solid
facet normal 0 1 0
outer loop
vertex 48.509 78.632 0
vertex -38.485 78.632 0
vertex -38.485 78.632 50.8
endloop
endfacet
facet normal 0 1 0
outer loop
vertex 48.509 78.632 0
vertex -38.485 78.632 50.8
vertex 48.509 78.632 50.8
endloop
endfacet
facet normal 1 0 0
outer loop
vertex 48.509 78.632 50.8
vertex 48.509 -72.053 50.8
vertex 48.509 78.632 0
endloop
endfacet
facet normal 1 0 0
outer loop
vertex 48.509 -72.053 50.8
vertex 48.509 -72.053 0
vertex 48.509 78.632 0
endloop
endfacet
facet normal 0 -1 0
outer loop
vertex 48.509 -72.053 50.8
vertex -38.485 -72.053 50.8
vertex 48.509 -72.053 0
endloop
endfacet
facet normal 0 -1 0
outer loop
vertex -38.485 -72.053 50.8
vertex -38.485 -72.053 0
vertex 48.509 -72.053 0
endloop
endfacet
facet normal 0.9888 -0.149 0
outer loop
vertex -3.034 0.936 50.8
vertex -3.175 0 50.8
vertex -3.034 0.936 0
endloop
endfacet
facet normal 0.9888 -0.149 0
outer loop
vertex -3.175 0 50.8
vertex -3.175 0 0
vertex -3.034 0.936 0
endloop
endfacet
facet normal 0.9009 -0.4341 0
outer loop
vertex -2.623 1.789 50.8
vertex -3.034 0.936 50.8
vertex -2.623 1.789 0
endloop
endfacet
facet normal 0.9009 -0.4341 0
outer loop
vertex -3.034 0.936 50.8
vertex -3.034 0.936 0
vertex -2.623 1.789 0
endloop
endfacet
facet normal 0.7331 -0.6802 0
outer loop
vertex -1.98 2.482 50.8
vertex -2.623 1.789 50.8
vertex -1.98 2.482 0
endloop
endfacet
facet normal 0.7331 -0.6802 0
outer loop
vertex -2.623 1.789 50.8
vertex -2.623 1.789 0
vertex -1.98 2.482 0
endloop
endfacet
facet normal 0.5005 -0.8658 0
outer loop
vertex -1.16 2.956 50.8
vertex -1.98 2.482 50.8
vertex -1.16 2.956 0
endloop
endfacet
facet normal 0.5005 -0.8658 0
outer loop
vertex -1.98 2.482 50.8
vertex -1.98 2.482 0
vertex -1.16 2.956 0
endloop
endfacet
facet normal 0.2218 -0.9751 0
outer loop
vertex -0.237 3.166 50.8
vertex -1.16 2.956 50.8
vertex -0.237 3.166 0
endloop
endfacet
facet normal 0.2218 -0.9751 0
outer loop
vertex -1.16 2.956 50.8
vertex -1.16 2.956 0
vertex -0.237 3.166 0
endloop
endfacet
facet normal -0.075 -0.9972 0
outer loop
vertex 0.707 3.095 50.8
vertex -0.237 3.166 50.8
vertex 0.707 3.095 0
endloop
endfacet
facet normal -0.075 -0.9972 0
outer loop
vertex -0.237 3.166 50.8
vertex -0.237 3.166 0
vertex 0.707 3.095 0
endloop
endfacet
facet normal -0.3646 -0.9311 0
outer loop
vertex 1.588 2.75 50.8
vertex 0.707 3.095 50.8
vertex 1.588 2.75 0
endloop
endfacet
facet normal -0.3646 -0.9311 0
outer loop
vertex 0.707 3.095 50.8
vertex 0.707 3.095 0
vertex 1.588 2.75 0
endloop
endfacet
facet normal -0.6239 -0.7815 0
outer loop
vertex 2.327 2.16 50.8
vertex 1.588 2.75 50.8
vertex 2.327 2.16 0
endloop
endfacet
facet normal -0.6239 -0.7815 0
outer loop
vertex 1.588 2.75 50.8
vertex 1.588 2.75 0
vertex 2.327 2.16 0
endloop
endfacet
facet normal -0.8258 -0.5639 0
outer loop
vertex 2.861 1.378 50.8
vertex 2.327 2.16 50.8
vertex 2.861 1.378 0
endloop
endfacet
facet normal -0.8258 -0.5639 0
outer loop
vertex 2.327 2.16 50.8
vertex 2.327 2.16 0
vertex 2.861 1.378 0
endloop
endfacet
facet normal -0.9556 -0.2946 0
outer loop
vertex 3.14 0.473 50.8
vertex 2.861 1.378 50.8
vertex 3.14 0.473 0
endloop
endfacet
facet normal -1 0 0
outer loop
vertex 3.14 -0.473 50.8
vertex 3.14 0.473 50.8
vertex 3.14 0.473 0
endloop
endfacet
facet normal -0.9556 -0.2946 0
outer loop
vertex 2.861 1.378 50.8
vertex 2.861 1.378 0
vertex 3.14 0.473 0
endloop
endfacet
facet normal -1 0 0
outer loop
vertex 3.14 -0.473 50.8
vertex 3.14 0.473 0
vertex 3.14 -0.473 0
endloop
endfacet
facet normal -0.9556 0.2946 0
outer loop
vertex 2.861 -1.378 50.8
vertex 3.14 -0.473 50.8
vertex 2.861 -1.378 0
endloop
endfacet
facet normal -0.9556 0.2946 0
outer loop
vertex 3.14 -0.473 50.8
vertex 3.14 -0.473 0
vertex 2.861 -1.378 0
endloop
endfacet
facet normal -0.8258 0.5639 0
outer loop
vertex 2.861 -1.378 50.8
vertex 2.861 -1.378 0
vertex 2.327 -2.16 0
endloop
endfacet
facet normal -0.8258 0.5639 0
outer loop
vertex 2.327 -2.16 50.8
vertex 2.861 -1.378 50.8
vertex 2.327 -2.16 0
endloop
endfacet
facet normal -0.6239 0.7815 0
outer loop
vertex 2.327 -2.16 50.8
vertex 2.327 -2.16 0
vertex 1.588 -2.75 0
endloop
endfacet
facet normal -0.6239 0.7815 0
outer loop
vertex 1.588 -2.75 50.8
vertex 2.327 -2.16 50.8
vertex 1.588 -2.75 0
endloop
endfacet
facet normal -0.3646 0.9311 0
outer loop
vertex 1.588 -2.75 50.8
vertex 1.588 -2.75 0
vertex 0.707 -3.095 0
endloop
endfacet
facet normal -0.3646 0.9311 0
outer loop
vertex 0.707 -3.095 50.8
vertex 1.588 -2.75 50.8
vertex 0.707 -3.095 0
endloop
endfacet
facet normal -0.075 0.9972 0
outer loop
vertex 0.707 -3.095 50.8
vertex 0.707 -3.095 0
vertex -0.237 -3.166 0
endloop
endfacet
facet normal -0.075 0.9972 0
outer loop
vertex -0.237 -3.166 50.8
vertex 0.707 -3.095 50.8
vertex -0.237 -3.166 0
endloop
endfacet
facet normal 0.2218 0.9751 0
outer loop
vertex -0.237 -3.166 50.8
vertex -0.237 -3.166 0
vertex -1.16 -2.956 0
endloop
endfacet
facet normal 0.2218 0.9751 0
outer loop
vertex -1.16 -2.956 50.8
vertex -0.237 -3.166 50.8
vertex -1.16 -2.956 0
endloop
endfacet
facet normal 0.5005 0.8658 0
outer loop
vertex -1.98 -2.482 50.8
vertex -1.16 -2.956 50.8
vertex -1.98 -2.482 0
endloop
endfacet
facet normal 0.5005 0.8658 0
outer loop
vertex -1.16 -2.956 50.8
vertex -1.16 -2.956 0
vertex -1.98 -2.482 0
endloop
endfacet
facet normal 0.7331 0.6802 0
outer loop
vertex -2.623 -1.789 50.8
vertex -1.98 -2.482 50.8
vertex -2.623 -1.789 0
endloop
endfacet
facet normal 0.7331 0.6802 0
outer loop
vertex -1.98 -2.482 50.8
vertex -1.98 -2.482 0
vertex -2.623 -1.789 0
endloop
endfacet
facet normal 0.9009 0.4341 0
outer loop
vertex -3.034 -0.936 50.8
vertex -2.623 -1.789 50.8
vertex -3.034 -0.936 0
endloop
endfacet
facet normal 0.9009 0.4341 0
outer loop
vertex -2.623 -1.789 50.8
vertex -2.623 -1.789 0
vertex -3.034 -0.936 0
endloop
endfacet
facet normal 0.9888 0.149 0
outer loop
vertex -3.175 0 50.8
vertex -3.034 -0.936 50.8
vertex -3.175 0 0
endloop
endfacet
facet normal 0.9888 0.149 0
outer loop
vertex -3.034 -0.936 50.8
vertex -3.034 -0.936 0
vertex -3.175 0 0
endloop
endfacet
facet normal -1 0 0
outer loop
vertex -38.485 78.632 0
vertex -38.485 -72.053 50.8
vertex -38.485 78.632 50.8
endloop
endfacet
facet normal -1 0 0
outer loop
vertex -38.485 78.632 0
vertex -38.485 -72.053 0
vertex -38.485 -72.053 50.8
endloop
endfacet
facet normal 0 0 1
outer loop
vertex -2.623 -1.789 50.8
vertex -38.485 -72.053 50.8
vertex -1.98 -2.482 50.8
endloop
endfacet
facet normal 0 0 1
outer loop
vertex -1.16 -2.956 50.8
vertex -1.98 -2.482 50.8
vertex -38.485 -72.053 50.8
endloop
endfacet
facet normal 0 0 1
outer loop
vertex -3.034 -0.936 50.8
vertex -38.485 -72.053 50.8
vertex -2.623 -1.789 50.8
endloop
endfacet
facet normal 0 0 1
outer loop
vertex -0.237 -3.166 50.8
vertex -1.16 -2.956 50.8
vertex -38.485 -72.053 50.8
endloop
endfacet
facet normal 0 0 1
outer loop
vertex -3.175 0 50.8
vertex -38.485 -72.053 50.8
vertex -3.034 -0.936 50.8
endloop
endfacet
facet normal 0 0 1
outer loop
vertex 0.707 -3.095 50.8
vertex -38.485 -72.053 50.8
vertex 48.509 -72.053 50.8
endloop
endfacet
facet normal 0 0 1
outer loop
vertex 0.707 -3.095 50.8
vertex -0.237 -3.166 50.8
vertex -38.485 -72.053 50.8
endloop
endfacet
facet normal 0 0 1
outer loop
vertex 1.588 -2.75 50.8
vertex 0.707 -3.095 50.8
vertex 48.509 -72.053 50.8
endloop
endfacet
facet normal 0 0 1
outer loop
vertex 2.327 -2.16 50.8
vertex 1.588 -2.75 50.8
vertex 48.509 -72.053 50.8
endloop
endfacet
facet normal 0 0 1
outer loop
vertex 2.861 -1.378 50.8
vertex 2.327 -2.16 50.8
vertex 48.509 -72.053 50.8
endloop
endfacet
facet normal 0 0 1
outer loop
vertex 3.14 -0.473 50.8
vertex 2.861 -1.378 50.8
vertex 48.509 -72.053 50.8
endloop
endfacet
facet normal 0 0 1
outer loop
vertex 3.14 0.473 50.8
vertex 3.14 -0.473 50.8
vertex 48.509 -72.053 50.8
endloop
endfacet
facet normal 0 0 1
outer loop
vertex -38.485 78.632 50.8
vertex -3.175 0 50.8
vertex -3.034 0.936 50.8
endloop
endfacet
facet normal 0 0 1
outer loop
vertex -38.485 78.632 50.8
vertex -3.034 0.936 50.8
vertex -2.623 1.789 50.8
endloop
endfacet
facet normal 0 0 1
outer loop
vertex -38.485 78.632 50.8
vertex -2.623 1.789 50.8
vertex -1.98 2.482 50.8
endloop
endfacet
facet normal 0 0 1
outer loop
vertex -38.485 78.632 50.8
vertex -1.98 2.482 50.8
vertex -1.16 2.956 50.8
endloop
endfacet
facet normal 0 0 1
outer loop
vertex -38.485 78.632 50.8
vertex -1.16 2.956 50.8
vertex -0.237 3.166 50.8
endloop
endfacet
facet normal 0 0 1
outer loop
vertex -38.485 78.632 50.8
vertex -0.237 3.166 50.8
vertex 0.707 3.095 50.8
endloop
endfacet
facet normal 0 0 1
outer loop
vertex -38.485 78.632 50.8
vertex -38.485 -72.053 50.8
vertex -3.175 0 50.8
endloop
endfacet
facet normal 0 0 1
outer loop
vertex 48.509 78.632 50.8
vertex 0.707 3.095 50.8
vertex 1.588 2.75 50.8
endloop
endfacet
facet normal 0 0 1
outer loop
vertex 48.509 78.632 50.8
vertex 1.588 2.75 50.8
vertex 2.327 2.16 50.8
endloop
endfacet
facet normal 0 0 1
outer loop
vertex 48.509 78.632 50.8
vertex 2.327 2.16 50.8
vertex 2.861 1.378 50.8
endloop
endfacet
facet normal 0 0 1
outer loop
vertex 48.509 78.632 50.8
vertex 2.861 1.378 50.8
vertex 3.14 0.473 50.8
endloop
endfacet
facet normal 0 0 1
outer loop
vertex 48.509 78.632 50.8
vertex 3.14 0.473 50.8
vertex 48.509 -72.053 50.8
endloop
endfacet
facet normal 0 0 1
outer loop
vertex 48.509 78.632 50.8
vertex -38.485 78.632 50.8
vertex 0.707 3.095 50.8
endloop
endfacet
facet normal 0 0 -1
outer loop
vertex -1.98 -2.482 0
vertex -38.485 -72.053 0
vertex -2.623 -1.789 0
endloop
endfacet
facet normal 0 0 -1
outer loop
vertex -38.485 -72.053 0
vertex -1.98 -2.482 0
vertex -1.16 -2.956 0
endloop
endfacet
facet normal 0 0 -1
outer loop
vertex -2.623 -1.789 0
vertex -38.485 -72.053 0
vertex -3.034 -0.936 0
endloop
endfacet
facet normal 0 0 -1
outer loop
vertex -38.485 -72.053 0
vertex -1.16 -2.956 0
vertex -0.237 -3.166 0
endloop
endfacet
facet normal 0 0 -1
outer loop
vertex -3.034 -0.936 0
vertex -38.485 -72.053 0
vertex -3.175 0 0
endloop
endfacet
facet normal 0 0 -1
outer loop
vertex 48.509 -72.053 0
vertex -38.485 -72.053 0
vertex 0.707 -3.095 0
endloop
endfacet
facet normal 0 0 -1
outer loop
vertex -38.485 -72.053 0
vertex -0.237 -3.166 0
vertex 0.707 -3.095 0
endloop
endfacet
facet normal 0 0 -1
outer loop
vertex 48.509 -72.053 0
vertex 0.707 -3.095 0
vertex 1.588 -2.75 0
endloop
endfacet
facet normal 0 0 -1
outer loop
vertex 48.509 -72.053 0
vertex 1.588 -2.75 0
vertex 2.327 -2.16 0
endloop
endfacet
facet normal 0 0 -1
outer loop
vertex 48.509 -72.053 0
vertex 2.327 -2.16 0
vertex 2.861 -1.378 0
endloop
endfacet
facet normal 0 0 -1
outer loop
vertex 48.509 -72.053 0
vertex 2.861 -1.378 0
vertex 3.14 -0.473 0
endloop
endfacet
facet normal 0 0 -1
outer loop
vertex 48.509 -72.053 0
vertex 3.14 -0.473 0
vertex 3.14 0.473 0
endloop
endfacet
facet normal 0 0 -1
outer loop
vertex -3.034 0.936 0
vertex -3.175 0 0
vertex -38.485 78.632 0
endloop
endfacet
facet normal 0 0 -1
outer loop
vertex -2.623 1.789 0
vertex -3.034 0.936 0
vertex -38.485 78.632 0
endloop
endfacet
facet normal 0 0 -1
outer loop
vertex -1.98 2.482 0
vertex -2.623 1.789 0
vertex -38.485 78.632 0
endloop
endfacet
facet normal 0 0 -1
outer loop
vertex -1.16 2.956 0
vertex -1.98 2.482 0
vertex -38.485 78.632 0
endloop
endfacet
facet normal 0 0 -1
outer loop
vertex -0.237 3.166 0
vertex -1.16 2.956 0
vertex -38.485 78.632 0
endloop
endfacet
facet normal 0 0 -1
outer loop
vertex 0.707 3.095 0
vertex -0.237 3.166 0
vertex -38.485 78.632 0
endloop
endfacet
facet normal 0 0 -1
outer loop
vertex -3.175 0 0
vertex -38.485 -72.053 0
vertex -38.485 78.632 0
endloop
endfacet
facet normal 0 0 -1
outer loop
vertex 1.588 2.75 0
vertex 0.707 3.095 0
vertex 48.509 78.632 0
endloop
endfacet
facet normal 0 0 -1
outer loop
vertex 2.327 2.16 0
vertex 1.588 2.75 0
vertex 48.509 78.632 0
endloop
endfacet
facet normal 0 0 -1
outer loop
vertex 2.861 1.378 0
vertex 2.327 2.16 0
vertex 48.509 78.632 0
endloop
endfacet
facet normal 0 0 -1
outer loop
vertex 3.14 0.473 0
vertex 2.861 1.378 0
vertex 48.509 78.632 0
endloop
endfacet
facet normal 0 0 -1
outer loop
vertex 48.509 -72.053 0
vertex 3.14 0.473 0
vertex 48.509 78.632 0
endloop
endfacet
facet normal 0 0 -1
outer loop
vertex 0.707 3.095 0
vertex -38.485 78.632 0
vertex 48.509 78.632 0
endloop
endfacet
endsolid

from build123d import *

# Parameters (mm, degrees)
F0_W     = 86.9941338897
F0_H     = 125.2852901816
F1_DEPTH = 25.4
F2_DEPTH = 25.4
F4_D     = 6.35
F5_DEPTH = 25.4


with BuildPart() as f1:
    # F0 (on Top) → F1 (new body)
    with BuildSketch(Plane.XY):
        with Locations((5.0123818219, 15.9891955554)):
            Rectangle(F0_W, F0_H)
    extrude(amount=F1_DEPTH)

    # F2 (add): a face of the model
    f2_faces = [f1.faces().sort_by_distance(p)[0] for p in [
        (5.0123818219, -46.6534495354, 12.7),
    ]]
    extrude(f2_faces, amount=F2_DEPTH)

    # F4 (through all)
    with Locations(Plane.XY.offset(25.4)):
        with Locations((0, 0)):
            Hole(F4_D / 2)

    # F5 (add): a face of the model
    f5_faces = [f1.faces().sort_by_distance(p)[0] for p in [
        (5.0245204925, 3.2971611221, 25.4),
    ]]
    extrude(f5_faces, amount=F5_DEPTH)


solid = f1.part
